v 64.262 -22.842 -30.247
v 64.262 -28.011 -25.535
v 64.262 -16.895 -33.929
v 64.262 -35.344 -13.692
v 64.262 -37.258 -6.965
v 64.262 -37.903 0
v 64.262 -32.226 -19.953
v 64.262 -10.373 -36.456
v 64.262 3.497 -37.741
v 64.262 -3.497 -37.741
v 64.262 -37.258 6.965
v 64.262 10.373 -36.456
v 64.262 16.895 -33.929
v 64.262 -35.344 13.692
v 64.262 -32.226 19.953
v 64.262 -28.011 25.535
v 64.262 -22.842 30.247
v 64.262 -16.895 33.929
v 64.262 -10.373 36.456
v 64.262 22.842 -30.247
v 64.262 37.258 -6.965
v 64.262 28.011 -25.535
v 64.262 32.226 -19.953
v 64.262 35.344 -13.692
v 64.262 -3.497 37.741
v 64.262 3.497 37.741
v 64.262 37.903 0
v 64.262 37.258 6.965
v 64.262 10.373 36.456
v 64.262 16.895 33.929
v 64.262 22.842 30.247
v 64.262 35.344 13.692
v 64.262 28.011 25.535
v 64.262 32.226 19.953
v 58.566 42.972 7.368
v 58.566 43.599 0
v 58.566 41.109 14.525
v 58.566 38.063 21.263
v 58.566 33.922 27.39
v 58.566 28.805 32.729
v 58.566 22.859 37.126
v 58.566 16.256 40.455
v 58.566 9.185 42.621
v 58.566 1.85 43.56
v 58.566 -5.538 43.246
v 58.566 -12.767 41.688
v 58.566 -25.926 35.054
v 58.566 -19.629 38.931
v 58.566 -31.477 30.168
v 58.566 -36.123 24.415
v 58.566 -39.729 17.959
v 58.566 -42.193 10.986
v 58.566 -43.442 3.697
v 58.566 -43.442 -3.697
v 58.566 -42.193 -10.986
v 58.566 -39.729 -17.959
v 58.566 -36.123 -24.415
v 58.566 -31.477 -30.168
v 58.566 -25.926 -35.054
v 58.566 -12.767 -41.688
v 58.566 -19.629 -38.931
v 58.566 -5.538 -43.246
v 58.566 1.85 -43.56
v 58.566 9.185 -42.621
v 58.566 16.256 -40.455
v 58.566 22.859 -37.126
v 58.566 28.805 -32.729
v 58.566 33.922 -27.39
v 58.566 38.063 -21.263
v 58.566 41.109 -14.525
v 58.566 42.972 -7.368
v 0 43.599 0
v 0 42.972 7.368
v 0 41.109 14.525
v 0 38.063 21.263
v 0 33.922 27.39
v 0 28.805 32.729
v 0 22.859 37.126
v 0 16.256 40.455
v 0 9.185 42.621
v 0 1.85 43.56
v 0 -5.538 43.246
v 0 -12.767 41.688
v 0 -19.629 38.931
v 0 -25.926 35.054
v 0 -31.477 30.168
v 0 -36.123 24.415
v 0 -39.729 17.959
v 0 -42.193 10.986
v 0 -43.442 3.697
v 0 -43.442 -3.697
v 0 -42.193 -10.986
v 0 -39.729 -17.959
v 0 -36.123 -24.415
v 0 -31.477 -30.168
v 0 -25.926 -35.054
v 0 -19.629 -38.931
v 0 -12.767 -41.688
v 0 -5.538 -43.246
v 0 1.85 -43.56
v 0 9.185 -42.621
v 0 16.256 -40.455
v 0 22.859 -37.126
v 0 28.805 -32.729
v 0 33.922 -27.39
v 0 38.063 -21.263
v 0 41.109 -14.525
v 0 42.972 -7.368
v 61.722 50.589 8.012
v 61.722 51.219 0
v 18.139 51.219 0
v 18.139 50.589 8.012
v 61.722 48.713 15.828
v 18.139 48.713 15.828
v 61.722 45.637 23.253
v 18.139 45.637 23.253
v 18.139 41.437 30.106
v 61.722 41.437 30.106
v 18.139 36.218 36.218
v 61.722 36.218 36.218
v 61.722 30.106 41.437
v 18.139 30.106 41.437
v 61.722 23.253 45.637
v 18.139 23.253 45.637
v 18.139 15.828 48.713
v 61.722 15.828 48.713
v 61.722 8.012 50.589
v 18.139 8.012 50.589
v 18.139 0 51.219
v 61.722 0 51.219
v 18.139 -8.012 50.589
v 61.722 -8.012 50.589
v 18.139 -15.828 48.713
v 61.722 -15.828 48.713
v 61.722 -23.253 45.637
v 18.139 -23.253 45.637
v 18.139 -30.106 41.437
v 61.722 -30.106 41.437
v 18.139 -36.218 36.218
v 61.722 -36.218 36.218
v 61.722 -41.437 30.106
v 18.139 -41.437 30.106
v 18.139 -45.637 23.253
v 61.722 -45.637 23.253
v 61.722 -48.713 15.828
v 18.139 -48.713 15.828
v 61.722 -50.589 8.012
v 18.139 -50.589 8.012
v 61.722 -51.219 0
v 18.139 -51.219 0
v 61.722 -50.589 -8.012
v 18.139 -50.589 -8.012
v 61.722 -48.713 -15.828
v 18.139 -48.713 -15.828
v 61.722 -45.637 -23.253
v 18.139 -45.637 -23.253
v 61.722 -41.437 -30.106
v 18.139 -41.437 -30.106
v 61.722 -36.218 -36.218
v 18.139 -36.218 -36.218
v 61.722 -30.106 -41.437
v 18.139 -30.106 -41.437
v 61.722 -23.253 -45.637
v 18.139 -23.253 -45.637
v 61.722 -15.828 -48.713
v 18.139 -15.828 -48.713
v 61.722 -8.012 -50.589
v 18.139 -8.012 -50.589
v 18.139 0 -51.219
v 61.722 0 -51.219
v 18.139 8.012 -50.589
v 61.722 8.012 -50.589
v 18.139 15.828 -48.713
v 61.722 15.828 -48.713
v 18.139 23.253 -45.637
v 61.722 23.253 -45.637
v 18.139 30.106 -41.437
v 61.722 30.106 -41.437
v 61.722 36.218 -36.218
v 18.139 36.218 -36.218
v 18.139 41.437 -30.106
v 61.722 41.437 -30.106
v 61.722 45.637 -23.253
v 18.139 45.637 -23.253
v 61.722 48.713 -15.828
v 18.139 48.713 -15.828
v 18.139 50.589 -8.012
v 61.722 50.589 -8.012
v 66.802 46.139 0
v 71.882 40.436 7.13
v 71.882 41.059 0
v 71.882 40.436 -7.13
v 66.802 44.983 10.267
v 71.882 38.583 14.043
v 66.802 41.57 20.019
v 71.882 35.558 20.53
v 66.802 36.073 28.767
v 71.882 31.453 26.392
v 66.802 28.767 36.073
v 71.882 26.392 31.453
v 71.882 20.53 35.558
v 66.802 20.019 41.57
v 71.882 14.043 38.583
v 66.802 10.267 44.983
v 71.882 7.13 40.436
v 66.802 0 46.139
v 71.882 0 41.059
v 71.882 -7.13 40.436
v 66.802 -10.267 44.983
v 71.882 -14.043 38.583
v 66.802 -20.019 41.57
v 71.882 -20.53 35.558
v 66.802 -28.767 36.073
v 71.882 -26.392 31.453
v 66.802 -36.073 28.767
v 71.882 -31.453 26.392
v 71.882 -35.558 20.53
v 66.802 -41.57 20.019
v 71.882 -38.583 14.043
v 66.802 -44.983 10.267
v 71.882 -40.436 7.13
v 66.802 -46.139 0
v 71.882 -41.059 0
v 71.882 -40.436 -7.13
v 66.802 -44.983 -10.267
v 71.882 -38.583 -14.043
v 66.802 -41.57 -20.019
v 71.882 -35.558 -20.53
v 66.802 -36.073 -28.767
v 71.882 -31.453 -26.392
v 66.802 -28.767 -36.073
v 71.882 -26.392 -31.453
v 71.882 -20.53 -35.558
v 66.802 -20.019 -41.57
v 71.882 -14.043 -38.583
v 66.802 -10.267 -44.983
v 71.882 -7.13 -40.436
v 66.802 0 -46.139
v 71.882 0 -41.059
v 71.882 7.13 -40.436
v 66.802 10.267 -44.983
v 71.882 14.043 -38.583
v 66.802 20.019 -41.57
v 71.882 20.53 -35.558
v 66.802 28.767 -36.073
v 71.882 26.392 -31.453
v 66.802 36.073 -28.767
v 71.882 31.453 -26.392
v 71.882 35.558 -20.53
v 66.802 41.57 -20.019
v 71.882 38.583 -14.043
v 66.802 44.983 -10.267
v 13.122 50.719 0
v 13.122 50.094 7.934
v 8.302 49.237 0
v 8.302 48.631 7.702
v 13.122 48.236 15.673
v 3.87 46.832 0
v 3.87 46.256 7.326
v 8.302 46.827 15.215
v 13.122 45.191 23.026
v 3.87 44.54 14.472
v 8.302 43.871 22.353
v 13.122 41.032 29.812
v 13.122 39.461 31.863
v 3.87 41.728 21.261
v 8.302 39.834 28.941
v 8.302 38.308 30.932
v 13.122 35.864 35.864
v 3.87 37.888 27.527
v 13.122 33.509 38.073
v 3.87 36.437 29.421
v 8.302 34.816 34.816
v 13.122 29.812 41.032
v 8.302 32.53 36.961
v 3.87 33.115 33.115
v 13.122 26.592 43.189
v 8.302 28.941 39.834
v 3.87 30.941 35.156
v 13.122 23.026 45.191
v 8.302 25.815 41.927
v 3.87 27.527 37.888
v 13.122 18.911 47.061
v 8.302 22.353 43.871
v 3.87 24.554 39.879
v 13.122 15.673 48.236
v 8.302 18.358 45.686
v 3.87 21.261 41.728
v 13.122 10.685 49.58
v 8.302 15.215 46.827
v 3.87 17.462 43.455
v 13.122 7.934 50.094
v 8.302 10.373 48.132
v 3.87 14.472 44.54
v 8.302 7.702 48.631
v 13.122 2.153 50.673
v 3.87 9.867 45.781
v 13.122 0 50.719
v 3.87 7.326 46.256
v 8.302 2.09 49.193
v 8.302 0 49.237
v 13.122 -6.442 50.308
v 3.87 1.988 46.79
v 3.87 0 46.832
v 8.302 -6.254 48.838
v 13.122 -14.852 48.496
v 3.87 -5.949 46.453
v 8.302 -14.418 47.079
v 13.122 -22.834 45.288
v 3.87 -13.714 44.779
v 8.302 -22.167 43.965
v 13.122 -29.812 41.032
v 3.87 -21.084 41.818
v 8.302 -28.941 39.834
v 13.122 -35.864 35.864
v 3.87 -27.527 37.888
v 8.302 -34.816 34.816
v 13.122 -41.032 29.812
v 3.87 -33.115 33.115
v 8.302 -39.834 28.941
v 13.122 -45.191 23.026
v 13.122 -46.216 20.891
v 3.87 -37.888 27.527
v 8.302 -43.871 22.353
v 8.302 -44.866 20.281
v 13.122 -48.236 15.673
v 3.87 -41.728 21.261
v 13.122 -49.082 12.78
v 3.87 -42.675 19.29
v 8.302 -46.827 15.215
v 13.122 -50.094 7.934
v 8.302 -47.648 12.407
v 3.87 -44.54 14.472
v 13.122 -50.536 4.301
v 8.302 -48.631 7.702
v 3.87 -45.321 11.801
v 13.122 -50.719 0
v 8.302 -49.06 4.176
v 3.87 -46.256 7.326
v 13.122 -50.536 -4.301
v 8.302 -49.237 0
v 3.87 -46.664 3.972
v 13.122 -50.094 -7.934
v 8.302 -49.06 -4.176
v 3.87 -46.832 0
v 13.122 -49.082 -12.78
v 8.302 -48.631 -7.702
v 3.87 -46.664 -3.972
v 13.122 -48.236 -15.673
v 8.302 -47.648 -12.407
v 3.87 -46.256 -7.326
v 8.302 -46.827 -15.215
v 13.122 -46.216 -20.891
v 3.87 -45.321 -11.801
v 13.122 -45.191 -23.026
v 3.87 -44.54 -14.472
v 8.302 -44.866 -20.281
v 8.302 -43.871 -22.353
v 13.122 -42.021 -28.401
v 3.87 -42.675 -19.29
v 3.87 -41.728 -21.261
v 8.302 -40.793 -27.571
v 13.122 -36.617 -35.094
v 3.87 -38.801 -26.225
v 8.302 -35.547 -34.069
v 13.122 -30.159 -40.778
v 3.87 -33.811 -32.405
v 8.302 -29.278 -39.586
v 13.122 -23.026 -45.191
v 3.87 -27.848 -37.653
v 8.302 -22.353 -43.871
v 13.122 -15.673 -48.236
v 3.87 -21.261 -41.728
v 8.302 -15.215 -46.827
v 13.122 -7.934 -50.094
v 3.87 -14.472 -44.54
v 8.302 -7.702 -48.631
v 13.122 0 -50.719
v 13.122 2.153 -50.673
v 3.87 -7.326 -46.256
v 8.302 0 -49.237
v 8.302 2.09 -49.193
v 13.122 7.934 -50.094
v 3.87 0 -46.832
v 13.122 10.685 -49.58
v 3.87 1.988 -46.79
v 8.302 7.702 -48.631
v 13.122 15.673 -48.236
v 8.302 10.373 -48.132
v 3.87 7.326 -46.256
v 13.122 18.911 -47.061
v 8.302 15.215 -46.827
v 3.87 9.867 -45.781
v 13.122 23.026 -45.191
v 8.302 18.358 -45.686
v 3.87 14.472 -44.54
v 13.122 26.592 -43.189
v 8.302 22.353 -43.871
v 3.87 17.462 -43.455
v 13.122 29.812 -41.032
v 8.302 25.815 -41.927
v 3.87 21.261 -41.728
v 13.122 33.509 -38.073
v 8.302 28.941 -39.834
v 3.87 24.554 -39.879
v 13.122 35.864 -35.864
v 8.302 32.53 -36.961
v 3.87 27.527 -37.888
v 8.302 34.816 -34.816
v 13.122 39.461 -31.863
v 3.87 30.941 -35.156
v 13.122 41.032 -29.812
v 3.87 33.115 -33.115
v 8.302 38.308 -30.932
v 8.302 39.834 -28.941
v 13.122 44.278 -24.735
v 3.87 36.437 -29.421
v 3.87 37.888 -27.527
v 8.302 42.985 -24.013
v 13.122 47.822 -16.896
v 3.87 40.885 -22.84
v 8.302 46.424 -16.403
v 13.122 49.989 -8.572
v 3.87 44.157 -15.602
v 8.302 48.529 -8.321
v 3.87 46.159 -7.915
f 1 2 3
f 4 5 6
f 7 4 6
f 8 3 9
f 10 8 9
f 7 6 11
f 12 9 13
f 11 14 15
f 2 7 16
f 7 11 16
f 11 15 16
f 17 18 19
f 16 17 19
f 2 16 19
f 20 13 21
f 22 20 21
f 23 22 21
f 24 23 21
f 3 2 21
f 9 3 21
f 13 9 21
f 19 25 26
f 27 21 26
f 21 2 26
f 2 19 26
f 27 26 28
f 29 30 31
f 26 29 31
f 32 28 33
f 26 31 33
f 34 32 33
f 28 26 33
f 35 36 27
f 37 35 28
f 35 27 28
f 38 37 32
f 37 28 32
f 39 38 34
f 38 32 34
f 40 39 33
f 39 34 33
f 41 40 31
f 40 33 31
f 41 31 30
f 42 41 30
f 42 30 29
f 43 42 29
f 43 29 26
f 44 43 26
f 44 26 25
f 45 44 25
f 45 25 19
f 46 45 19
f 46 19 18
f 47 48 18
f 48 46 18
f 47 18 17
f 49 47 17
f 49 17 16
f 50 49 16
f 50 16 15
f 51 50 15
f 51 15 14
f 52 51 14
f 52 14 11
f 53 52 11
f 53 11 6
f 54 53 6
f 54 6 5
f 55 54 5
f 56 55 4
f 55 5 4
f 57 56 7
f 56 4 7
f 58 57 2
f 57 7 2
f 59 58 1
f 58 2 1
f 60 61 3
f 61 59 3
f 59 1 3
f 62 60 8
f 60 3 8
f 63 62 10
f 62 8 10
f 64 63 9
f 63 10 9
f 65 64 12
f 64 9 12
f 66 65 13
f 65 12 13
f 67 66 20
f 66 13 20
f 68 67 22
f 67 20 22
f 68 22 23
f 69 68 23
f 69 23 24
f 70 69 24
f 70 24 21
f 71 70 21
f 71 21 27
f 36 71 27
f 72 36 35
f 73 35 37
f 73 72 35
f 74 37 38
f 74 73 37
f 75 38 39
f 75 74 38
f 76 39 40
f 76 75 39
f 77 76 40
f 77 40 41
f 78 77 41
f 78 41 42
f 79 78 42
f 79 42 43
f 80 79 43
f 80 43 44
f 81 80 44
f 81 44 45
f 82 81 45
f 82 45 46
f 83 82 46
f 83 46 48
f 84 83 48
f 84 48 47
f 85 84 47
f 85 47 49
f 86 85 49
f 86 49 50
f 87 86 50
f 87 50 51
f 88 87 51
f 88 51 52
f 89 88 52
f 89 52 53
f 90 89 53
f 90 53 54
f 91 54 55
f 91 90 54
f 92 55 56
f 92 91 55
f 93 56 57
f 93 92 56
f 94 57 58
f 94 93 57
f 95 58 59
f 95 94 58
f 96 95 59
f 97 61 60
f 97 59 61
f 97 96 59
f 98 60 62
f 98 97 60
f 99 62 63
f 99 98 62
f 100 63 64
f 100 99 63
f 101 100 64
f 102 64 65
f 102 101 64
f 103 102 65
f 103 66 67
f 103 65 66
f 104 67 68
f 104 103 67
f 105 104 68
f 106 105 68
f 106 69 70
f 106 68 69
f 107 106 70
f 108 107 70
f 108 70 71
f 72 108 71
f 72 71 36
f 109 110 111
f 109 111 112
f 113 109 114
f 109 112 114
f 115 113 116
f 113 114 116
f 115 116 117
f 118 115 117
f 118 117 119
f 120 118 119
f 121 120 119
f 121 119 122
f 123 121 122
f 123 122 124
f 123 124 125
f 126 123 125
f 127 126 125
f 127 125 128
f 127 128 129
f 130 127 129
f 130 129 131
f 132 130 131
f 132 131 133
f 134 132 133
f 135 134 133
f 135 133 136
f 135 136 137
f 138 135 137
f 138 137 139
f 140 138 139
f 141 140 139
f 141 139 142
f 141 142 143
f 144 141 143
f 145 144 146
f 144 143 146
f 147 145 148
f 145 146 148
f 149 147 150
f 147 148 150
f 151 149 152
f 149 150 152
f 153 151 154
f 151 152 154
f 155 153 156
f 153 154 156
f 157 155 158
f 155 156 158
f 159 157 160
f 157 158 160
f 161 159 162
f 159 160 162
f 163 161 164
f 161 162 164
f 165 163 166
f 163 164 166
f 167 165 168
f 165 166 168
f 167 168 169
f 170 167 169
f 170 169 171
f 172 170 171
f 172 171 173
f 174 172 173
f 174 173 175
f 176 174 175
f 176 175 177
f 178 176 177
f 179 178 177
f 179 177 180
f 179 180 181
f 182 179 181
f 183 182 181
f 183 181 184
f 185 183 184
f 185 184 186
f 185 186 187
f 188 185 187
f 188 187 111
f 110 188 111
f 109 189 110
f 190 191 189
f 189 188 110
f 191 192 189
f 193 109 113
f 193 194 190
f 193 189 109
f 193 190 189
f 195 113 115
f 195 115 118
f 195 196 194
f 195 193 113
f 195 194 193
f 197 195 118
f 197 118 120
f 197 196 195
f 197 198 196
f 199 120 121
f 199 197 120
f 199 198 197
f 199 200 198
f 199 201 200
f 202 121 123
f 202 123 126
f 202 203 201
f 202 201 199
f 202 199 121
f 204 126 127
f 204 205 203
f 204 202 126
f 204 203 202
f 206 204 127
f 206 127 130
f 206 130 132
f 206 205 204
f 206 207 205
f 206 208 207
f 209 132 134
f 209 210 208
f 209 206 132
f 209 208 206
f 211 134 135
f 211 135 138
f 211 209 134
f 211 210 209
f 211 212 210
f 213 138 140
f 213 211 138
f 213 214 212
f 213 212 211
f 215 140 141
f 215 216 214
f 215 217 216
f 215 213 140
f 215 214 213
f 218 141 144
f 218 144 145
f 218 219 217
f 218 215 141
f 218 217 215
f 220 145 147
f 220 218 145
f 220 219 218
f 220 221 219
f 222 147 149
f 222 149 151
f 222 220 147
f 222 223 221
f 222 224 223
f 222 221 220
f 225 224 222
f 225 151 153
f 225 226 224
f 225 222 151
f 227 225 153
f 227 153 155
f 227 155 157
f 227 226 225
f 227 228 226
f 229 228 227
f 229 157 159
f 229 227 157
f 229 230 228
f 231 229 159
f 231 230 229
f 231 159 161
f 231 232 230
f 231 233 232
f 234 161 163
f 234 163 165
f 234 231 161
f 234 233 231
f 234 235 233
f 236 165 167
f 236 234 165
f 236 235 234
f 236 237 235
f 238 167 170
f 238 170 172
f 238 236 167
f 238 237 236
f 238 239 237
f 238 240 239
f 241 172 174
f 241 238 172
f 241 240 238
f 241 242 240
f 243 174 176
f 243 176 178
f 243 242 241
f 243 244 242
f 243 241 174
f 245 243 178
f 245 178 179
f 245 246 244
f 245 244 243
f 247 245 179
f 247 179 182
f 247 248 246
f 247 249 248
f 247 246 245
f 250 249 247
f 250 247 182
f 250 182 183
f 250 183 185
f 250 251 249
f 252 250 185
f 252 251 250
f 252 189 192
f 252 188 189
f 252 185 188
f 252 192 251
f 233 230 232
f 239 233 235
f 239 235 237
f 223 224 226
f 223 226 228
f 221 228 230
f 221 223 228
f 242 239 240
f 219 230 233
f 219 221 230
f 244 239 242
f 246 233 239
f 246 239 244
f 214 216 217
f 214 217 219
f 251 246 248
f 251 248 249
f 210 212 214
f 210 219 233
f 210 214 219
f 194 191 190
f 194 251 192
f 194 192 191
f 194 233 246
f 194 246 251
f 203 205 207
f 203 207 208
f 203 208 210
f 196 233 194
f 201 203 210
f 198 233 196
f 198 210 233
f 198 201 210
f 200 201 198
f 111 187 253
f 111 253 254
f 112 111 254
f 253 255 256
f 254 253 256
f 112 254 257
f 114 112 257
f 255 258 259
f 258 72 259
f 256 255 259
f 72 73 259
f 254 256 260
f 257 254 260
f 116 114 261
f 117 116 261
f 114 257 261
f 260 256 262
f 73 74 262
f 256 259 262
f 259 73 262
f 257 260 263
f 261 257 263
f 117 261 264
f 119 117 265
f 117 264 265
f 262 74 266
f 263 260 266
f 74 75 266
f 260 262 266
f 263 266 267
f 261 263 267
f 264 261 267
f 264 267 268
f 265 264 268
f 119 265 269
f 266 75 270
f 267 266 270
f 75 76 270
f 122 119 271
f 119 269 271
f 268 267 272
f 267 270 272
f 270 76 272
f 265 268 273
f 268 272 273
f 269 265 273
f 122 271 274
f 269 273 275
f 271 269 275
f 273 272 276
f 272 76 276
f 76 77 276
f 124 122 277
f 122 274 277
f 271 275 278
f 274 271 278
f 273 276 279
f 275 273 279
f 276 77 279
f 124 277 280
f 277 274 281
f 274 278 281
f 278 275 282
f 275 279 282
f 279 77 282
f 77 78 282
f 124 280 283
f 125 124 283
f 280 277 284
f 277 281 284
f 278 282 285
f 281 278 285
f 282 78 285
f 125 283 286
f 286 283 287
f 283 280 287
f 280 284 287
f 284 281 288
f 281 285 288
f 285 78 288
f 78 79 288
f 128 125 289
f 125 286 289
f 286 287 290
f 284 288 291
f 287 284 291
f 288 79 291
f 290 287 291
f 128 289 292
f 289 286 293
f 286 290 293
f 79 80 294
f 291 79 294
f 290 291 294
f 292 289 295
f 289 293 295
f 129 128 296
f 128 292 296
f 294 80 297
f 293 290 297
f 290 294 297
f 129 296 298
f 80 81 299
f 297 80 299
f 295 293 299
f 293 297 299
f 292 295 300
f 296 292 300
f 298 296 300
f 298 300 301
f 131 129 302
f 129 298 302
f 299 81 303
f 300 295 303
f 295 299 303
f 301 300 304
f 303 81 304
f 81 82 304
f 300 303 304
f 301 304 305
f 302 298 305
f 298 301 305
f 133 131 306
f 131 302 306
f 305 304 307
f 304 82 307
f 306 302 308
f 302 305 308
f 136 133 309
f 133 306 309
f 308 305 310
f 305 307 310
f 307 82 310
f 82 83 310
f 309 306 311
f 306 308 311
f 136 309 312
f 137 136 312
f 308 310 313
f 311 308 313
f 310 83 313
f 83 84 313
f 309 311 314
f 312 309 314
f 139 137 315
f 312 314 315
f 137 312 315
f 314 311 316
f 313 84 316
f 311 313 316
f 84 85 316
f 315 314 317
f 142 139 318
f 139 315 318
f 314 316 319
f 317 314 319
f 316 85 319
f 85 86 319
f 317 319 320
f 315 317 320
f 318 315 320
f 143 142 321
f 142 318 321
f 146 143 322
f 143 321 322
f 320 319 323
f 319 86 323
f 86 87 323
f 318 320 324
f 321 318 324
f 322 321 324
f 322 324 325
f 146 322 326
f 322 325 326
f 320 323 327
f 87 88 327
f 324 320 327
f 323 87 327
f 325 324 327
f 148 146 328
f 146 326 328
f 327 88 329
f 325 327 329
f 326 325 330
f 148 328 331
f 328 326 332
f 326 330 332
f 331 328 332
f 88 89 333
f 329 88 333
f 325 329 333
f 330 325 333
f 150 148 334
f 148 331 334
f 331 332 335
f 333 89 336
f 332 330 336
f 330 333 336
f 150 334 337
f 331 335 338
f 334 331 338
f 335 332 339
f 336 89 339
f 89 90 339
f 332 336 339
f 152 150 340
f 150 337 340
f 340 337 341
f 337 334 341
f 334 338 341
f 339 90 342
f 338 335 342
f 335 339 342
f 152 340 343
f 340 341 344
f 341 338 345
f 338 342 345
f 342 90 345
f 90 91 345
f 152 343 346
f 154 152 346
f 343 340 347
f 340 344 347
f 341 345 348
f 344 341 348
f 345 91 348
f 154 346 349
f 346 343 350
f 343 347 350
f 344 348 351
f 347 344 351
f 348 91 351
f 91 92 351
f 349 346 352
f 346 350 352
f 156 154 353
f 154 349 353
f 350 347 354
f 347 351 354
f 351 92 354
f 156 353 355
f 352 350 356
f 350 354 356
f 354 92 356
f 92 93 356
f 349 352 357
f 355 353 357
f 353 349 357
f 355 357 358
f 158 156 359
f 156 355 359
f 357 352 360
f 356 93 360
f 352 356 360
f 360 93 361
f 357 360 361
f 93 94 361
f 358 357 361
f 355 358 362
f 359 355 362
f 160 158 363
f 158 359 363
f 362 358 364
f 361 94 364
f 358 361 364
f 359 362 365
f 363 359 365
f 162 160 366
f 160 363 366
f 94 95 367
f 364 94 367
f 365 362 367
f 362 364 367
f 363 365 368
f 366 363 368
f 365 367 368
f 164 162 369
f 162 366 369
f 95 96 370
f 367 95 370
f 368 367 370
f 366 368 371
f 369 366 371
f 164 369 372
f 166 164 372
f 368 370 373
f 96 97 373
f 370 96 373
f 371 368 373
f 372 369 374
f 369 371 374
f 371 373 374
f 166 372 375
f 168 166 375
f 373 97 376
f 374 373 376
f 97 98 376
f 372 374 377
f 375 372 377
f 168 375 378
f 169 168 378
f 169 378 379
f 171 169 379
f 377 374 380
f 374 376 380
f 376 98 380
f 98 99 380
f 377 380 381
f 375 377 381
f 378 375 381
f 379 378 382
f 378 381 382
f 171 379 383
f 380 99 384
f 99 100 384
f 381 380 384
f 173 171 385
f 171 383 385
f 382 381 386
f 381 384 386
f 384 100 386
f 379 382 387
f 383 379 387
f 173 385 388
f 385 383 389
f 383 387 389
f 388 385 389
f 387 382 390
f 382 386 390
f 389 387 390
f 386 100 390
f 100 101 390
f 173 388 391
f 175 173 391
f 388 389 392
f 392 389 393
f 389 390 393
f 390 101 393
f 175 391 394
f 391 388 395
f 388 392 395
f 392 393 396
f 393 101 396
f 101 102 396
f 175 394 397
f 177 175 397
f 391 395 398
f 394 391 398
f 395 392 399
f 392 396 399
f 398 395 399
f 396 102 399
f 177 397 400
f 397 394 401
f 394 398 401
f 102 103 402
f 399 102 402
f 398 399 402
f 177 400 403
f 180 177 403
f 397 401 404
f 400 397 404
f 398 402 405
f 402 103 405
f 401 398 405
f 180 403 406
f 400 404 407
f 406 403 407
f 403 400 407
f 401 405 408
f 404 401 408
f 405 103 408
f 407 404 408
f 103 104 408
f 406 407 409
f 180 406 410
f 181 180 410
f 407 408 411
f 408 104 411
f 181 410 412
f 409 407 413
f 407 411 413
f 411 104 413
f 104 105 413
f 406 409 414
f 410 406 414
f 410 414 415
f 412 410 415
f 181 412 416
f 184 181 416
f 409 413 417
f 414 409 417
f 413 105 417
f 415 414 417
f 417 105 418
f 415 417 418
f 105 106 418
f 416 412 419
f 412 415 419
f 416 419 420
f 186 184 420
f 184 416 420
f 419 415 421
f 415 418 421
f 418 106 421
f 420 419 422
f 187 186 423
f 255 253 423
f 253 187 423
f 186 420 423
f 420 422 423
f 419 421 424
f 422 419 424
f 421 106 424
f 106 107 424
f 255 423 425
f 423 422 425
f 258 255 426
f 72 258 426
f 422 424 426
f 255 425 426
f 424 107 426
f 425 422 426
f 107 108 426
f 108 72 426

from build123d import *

# Parameters (mm, degrees)
F0_R     = 51.2193764732
F1_DEPTH = 71.882
F2_SIZE  = 10.16
F3_T     = -7.62


# Not quite as in the source:
# - a fillet or chamfer that OpenCascade refuses, or shapes differently, is made with other operations: its cross-section is extruded or revolved along the edge and cut away or added


with BuildPart() as f1:
    # F0 (on Right) → F1 (new body)
    with BuildSketch(Plane.YZ):
        Circle(F0_R)
    extrude(amount=F1_DEPTH)

    # F2
    f2_edges = [f1.edges().sort_by_distance(p)[0] for p in [
        (71.882, -51.219376, 0),
    ]]
    chamfer(f2_edges, length=F2_SIZE)

    # F3
    f3_openings = [f1.faces().sort_by_distance(p)[0] for p in [
        (0, 0, 0),
    ]]
    offset(amount=F3_T, openings=f3_openings)

    # F4: fillet of radius 25.4 on 1 edges, made by hand

    # F4_s1 → F4_t2 (revolve, cut)
    with BuildSketch(Plane.XY):
        with BuildLine():
            ThreePointArc((18.1392282085, 51.2193764732), (8.3018505091, 49.2370193947), (0, 43.5993764732))
            Line((0, 43.5993764732), (0, 51.2193764732))
            Line((0, 51.2193764732), (18.1392282085, 51.2193764732))
        make_face()
    revolve(axis=Axis((0, 0, 0), (1, 0, 0)), mode=Mode.SUBTRACT)


solid = f1.part
